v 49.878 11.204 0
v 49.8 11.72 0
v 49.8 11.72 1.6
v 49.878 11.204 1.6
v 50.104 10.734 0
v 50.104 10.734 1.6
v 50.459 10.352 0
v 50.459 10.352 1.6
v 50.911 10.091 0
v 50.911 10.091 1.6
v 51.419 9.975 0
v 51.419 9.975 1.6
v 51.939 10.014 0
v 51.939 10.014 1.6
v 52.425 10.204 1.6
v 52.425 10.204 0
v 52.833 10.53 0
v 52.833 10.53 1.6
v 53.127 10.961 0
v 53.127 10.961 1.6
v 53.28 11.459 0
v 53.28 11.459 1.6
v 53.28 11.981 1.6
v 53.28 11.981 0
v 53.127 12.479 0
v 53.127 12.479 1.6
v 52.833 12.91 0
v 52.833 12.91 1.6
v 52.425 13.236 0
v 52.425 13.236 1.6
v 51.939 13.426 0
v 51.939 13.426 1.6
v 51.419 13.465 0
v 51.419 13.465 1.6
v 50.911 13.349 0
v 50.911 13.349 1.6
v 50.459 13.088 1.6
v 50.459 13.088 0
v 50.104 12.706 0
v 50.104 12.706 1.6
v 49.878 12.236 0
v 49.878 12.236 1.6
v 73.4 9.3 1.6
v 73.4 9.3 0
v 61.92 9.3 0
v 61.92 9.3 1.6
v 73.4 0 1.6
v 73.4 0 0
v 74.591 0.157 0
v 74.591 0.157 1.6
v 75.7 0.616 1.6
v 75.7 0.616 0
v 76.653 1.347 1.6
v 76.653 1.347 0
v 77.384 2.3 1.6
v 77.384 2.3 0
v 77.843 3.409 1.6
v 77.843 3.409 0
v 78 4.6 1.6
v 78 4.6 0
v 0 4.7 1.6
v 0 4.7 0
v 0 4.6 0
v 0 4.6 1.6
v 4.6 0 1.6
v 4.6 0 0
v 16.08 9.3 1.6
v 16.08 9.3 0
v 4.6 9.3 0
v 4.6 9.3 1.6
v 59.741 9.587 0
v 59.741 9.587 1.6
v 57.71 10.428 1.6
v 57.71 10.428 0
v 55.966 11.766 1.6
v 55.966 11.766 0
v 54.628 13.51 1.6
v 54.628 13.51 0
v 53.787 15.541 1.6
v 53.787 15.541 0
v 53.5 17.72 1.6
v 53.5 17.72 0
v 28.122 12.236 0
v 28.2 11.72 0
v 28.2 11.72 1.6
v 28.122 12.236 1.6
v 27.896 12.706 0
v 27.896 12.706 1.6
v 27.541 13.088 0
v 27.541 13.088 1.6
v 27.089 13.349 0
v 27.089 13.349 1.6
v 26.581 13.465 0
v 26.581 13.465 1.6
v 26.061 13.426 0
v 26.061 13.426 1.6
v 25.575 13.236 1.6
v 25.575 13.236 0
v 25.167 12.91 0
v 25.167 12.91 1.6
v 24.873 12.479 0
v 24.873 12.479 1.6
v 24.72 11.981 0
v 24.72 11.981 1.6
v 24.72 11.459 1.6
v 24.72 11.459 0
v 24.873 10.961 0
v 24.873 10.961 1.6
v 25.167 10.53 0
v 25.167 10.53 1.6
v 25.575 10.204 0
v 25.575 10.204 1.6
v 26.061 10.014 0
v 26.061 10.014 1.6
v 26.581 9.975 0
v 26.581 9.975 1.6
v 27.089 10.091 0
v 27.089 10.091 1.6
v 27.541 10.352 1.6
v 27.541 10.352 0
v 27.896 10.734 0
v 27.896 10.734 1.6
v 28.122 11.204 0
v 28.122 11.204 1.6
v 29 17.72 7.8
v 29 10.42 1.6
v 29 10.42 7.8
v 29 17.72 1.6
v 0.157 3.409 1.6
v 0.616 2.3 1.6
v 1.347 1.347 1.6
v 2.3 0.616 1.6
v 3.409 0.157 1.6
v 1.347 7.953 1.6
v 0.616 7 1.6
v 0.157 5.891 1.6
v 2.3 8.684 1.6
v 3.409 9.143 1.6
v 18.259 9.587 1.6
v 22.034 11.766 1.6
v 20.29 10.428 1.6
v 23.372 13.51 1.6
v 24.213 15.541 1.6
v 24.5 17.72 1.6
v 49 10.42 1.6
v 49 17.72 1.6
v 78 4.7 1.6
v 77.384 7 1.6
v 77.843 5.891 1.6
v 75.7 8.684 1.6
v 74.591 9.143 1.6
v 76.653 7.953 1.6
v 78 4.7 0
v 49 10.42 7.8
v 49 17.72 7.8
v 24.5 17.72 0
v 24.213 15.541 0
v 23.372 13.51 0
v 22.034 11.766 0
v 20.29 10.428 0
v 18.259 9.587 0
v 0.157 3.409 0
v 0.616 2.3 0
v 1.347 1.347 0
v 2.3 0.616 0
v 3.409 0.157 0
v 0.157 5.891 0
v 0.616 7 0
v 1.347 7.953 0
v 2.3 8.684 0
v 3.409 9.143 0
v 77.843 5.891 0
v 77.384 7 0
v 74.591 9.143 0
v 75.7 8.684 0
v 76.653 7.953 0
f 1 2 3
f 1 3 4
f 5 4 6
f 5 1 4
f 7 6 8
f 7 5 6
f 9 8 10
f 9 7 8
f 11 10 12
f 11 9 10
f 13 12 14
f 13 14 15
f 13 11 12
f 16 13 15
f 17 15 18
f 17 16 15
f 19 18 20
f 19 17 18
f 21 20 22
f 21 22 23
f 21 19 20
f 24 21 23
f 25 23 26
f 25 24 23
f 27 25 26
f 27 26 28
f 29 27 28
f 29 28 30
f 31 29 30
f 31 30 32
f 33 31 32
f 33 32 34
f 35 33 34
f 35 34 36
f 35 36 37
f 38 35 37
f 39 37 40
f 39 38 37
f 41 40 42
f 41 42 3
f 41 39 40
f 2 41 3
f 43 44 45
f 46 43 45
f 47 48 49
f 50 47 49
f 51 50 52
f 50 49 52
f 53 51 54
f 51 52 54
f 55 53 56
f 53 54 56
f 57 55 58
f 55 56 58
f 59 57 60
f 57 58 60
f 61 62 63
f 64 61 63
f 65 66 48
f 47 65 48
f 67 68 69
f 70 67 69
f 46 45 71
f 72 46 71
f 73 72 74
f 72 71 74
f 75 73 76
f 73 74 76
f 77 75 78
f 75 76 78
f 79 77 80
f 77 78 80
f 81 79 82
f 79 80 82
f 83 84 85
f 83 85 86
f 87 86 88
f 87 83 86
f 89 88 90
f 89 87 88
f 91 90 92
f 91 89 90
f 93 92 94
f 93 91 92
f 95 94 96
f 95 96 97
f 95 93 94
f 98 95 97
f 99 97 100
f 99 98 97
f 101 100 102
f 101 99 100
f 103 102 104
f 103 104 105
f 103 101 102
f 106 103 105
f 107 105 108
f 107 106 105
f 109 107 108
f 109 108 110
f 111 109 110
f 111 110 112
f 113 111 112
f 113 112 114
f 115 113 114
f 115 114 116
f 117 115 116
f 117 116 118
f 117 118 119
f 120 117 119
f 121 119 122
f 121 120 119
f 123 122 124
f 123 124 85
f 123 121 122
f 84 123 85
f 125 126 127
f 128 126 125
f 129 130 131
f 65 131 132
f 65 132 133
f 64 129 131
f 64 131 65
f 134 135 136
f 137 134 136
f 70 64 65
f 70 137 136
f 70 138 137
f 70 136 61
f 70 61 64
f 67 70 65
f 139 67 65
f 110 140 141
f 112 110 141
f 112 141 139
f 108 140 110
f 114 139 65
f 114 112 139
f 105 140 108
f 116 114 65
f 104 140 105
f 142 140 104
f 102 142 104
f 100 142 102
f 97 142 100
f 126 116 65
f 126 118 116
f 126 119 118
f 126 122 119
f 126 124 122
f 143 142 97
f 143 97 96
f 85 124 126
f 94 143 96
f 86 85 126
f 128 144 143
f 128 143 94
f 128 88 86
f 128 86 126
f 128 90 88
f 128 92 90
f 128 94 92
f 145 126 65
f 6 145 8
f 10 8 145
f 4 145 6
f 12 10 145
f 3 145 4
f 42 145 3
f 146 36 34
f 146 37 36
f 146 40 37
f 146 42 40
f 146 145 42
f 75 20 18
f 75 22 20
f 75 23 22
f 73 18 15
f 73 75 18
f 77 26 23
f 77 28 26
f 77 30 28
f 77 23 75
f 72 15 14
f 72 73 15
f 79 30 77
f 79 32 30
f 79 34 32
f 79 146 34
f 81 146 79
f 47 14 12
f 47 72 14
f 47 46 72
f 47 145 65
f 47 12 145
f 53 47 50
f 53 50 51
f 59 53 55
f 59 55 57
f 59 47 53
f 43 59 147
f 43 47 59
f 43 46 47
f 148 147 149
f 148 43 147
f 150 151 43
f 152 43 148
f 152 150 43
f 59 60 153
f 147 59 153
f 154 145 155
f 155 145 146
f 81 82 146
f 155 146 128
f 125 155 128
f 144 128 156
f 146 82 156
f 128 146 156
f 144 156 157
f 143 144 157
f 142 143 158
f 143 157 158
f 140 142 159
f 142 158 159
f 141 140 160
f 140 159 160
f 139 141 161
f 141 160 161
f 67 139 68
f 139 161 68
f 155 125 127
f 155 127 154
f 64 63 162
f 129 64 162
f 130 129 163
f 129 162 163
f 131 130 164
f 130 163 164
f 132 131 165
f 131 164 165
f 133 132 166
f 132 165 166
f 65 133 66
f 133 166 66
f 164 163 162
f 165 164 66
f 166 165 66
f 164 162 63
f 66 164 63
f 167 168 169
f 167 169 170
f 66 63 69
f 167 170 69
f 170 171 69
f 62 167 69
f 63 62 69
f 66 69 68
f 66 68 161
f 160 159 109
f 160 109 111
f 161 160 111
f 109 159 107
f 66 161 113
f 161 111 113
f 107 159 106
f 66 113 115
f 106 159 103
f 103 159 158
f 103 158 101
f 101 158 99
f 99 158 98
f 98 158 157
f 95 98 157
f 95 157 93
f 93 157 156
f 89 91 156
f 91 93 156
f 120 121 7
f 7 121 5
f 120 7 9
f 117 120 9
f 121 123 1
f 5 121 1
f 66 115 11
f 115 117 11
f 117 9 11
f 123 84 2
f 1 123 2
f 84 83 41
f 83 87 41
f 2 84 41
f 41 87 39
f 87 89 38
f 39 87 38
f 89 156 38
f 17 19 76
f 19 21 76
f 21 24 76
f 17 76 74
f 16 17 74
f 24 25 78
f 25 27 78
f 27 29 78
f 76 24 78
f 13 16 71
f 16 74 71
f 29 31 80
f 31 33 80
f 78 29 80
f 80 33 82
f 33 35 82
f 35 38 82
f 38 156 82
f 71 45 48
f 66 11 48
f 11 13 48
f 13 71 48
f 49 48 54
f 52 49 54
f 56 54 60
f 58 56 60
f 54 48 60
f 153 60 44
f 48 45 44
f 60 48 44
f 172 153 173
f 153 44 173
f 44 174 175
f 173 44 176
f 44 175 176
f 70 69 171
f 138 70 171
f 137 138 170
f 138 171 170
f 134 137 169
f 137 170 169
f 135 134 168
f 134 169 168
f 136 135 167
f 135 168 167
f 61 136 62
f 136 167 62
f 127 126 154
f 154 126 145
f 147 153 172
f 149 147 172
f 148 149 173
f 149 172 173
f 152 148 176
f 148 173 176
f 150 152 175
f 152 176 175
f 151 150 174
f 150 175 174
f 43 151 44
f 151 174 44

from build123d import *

# Parameters (mm, degrees)
ESQUISSE1_R        = 1.75
BOSS_EXTRU_1_DEPTH = 1.6
ESQUISSE2_W        = 20
ESQUISSE2_H        = 7.3
BOSS_EXTRU_2_DEPTH = 6.2


with BuildPart() as part:
    # Esquisse1 → Boss.-Extru.1 (new body)
    with BuildSketch(Plane.XY):
        with BuildLine():
            Line((4.6, 0), (73.4, 0))
            ThreePointArc((73.4, 0), (76.652691193, 1.347308807), (78, 4.6))
            Line((78, 4.6), (78, 4.7))
            ThreePointArc((78, 4.7), (76.652691193, 7.952691193), (73.4, 9.3))
            Line((73.4, 9.3), (61.92, 9.3))
            ThreePointArc((61.92, 9.3), (55.966160902, 11.766160902), (53.5, 17.72))
            Line((53.5, 17.72), (24.5, 17.72))
            ThreePointArc((24.5, 17.72), (22.033839098, 11.766160902), (16.08, 9.3))
            Line((16.08, 9.3), (4.6, 9.3))
            ThreePointArc((4.6, 9.3), (1.347308807, 7.952691193), (0, 4.7))
            Line((0, 4.7), (0, 4.6))
            ThreePointArc((0, 4.6), (1.347308807, 1.347308807), (4.6, 0))
        make_face()
        with Locations((26.45, 11.72)):
            Circle(ESQUISSE1_R, mode=Mode.SUBTRACT)
        with Locations(Location((51.55, 11.72, 0), (0, 0, 180))):
            Circle(ESQUISSE1_R, mode=Mode.SUBTRACT)
    extrude(amount=BOSS_EXTRU_1_DEPTH)

    # Esquisse2 → Boss.-Extru.2 (add)
    with BuildSketch(Plane.XY.offset(1.6)):
        with Locations((39, 14.07)):
            Rectangle(ESQUISSE2_W, ESQUISSE2_H)
    extrude(amount=BOSS_EXTRU_2_DEPTH)


solid = part.part
